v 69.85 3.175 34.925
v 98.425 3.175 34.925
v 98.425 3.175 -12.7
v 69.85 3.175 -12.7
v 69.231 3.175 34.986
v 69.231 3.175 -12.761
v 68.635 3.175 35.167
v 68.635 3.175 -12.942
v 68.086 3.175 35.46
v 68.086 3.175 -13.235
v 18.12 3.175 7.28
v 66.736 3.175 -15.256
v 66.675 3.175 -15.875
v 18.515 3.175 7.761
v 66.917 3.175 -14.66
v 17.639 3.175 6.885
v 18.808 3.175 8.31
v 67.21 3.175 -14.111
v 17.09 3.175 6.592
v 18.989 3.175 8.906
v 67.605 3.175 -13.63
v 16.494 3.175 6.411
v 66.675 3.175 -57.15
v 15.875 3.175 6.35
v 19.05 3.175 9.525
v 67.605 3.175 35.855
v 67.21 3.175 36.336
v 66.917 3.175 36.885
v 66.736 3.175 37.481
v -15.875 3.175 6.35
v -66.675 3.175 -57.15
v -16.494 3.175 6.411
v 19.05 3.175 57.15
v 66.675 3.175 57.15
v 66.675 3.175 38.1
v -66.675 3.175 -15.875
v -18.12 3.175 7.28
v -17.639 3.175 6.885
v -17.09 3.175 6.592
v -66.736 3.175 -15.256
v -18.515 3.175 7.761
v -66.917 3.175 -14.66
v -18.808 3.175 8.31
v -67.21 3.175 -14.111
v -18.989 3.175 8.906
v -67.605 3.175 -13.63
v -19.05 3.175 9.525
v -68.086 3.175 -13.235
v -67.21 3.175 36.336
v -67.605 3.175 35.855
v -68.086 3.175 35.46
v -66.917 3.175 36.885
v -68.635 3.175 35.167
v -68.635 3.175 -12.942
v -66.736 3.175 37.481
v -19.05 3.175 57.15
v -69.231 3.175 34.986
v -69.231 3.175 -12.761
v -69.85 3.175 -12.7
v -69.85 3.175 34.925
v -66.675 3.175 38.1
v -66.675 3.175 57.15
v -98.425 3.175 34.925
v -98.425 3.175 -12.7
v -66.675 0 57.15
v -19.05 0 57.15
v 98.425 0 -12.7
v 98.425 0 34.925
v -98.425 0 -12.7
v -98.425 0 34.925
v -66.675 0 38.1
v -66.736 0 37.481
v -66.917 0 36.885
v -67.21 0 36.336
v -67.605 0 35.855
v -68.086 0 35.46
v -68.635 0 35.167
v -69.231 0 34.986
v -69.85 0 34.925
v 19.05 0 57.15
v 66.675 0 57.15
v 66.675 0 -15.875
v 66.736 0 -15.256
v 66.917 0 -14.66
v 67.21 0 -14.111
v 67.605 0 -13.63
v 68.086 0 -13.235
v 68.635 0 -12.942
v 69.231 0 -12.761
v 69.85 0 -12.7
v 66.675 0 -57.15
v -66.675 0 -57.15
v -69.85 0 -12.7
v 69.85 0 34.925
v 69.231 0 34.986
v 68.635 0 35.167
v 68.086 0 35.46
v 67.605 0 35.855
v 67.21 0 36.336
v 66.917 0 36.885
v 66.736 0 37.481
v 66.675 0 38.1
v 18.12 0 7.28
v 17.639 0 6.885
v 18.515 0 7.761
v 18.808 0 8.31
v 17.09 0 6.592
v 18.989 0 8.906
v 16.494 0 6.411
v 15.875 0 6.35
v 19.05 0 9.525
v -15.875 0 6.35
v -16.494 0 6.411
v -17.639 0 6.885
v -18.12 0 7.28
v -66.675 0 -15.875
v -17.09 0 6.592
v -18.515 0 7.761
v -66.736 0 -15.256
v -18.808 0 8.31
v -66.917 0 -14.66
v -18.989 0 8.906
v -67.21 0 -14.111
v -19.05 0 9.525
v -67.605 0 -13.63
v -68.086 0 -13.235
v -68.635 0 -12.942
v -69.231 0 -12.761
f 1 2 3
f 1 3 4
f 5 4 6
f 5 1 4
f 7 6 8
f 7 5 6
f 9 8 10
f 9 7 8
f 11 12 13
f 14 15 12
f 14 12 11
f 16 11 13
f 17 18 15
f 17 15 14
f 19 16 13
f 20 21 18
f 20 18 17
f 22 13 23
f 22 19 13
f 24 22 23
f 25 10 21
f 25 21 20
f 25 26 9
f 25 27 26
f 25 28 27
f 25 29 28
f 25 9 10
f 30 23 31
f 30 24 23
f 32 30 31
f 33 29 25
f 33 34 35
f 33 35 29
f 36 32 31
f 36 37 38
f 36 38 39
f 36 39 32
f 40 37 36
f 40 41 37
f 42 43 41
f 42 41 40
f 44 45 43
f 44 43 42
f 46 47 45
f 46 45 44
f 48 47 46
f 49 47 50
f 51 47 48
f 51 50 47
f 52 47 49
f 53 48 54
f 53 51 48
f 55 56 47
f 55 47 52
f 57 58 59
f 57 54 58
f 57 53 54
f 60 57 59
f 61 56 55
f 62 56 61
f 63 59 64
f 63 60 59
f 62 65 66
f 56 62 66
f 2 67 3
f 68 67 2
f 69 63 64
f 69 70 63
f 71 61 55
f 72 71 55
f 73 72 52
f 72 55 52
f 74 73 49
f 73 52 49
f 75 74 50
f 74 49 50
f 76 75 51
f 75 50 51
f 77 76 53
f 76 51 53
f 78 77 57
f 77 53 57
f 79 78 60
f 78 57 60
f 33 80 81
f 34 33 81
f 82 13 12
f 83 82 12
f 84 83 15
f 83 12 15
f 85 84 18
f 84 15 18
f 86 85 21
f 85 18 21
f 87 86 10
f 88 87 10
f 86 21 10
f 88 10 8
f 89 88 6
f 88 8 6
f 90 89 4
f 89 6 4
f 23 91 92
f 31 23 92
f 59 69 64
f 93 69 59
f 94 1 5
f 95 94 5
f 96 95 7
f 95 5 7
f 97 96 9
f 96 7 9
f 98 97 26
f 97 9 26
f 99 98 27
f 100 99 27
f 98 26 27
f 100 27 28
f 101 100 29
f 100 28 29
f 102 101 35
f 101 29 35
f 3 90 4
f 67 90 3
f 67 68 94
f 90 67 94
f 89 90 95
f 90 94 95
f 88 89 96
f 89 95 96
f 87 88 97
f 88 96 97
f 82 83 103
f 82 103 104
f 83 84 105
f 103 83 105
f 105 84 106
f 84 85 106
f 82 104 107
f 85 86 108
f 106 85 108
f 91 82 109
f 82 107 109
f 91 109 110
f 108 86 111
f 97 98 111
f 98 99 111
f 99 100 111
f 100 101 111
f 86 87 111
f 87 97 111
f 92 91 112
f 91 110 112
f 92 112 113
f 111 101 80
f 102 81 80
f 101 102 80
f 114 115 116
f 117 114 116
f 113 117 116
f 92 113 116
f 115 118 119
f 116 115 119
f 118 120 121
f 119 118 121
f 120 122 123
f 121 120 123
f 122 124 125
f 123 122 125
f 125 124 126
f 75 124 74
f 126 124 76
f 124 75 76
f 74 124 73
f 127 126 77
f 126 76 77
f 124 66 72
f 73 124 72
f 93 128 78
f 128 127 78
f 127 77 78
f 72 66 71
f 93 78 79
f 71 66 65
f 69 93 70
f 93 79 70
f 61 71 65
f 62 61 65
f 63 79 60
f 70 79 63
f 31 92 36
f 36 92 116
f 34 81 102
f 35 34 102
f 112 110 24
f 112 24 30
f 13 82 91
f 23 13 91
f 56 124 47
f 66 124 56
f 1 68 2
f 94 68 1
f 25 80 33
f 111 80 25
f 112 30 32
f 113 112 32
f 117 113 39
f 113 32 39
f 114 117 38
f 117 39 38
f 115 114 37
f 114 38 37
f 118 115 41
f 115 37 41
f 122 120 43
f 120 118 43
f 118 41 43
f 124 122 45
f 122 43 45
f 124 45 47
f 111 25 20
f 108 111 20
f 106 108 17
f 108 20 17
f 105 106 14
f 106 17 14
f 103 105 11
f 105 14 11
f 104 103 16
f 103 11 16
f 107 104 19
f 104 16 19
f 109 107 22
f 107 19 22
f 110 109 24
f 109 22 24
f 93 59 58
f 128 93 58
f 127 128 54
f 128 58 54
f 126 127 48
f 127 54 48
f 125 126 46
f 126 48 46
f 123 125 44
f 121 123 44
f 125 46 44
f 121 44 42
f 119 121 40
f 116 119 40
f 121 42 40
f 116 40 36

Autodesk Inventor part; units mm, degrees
ref_plane "YZ Plane" through (0, 0, 0) normal (1, 0, 0) x (0, 1, 0)
ref_plane "XZ Plane" through (0, 0, 0) normal (0, 1, 0) x (-1, 0, 0)
ref_plane "XY Plane" through (0, 0, 0) normal (0, 0, 1) x (1, 0, 0)
sketch "Sketch1" plane through (0, 0, 0) normal (0, 1, 0) x (-1, 0, 0)
  line L0 (66.675, 57.15) -> (-66.675, 57.15)
  line L1 (-66.675, 57.15) -> (-66.675, -57.15)
  line L2 (-66.675, -57.15) -> (66.675, -57.15)
  line L3 (66.675, -57.15) -> (66.675, 57.15)
  line L4 (66.675, 57.15) -> (-66.675, -57.15) construction
  line L5 (-66.675, 57.15) -> (66.675, -57.15) construction
  line L6 (19.05, 107.95) -> (-19.05, 107.95)
  line L7 (-19.05, 107.95) -> (-19.05, 6.35)
  line L8 (-19.05, 6.35) -> (19.05, 6.35)
  line L9 (19.05, 6.35) -> (19.05, 107.95)
  line L10 (19.05, 107.95) -> (-19.05, 6.35) construction
  line L11 (-19.05, 107.95) -> (19.05, 6.35) construction
  line L12 (0, 57.15) -> (0, -57.15) construction
  line L13 (-98.425, 34.925) -> (98.425, 34.925)
  line L14 (98.425, 34.925) -> (98.425, -12.7)
  line L15 (98.425, -12.7) -> (-98.425, -12.7)
  line L16 (-98.425, -12.7) -> (-98.425, 34.925)
  line L17 (-98.425, 34.925) -> (98.425, -12.7) construction
  line L18 (98.425, 34.925) -> (-98.425, -12.7) construction
  point P0 (0, 0)
  point P1 (19.05, 57.15)
  point P2 (-19.05, 57.15)
  point P3 (0, 11.1125)
  point P4 (66.675, 34.925)
  point P5 (66.675, -12.7)
  point P6 (-66.675, -12.7)
  point P7 (-66.675, 34.925)
  dimension "d0" = 133.35
  dimension "d1" = 114.3
  dimension "d2" = 38.1
  dimension "d3" = 101.6
  dimension "d6" = 196.85
  dimension "d7" = 22.225
  dimension "d8" = 44.45
extrude "Extrusion1" add sketch "Sketch1" along normal blind 3.175 contours L3 L13 L9 L0 | L13 L14 L15 L3 | L3 L15 L1 L13 L7 L8 L9 | L7 L13 L1 L0 | L3 L2 L1 L15 | L15 L16 L13 L1
fillet "Fillet1" radius 3.175 6 edges at (66.675, 1.5875, 34.925) (66.675, 1.5875, -12.7) (-19.05, 1.5875, 6.35) (19.05, 1.5875, 6.35) (-66.675, 1.5875, 34.925) (-66.675, 1.5875, -12.7)
properties part number "Bottom Plate" material "UHMW, White"
